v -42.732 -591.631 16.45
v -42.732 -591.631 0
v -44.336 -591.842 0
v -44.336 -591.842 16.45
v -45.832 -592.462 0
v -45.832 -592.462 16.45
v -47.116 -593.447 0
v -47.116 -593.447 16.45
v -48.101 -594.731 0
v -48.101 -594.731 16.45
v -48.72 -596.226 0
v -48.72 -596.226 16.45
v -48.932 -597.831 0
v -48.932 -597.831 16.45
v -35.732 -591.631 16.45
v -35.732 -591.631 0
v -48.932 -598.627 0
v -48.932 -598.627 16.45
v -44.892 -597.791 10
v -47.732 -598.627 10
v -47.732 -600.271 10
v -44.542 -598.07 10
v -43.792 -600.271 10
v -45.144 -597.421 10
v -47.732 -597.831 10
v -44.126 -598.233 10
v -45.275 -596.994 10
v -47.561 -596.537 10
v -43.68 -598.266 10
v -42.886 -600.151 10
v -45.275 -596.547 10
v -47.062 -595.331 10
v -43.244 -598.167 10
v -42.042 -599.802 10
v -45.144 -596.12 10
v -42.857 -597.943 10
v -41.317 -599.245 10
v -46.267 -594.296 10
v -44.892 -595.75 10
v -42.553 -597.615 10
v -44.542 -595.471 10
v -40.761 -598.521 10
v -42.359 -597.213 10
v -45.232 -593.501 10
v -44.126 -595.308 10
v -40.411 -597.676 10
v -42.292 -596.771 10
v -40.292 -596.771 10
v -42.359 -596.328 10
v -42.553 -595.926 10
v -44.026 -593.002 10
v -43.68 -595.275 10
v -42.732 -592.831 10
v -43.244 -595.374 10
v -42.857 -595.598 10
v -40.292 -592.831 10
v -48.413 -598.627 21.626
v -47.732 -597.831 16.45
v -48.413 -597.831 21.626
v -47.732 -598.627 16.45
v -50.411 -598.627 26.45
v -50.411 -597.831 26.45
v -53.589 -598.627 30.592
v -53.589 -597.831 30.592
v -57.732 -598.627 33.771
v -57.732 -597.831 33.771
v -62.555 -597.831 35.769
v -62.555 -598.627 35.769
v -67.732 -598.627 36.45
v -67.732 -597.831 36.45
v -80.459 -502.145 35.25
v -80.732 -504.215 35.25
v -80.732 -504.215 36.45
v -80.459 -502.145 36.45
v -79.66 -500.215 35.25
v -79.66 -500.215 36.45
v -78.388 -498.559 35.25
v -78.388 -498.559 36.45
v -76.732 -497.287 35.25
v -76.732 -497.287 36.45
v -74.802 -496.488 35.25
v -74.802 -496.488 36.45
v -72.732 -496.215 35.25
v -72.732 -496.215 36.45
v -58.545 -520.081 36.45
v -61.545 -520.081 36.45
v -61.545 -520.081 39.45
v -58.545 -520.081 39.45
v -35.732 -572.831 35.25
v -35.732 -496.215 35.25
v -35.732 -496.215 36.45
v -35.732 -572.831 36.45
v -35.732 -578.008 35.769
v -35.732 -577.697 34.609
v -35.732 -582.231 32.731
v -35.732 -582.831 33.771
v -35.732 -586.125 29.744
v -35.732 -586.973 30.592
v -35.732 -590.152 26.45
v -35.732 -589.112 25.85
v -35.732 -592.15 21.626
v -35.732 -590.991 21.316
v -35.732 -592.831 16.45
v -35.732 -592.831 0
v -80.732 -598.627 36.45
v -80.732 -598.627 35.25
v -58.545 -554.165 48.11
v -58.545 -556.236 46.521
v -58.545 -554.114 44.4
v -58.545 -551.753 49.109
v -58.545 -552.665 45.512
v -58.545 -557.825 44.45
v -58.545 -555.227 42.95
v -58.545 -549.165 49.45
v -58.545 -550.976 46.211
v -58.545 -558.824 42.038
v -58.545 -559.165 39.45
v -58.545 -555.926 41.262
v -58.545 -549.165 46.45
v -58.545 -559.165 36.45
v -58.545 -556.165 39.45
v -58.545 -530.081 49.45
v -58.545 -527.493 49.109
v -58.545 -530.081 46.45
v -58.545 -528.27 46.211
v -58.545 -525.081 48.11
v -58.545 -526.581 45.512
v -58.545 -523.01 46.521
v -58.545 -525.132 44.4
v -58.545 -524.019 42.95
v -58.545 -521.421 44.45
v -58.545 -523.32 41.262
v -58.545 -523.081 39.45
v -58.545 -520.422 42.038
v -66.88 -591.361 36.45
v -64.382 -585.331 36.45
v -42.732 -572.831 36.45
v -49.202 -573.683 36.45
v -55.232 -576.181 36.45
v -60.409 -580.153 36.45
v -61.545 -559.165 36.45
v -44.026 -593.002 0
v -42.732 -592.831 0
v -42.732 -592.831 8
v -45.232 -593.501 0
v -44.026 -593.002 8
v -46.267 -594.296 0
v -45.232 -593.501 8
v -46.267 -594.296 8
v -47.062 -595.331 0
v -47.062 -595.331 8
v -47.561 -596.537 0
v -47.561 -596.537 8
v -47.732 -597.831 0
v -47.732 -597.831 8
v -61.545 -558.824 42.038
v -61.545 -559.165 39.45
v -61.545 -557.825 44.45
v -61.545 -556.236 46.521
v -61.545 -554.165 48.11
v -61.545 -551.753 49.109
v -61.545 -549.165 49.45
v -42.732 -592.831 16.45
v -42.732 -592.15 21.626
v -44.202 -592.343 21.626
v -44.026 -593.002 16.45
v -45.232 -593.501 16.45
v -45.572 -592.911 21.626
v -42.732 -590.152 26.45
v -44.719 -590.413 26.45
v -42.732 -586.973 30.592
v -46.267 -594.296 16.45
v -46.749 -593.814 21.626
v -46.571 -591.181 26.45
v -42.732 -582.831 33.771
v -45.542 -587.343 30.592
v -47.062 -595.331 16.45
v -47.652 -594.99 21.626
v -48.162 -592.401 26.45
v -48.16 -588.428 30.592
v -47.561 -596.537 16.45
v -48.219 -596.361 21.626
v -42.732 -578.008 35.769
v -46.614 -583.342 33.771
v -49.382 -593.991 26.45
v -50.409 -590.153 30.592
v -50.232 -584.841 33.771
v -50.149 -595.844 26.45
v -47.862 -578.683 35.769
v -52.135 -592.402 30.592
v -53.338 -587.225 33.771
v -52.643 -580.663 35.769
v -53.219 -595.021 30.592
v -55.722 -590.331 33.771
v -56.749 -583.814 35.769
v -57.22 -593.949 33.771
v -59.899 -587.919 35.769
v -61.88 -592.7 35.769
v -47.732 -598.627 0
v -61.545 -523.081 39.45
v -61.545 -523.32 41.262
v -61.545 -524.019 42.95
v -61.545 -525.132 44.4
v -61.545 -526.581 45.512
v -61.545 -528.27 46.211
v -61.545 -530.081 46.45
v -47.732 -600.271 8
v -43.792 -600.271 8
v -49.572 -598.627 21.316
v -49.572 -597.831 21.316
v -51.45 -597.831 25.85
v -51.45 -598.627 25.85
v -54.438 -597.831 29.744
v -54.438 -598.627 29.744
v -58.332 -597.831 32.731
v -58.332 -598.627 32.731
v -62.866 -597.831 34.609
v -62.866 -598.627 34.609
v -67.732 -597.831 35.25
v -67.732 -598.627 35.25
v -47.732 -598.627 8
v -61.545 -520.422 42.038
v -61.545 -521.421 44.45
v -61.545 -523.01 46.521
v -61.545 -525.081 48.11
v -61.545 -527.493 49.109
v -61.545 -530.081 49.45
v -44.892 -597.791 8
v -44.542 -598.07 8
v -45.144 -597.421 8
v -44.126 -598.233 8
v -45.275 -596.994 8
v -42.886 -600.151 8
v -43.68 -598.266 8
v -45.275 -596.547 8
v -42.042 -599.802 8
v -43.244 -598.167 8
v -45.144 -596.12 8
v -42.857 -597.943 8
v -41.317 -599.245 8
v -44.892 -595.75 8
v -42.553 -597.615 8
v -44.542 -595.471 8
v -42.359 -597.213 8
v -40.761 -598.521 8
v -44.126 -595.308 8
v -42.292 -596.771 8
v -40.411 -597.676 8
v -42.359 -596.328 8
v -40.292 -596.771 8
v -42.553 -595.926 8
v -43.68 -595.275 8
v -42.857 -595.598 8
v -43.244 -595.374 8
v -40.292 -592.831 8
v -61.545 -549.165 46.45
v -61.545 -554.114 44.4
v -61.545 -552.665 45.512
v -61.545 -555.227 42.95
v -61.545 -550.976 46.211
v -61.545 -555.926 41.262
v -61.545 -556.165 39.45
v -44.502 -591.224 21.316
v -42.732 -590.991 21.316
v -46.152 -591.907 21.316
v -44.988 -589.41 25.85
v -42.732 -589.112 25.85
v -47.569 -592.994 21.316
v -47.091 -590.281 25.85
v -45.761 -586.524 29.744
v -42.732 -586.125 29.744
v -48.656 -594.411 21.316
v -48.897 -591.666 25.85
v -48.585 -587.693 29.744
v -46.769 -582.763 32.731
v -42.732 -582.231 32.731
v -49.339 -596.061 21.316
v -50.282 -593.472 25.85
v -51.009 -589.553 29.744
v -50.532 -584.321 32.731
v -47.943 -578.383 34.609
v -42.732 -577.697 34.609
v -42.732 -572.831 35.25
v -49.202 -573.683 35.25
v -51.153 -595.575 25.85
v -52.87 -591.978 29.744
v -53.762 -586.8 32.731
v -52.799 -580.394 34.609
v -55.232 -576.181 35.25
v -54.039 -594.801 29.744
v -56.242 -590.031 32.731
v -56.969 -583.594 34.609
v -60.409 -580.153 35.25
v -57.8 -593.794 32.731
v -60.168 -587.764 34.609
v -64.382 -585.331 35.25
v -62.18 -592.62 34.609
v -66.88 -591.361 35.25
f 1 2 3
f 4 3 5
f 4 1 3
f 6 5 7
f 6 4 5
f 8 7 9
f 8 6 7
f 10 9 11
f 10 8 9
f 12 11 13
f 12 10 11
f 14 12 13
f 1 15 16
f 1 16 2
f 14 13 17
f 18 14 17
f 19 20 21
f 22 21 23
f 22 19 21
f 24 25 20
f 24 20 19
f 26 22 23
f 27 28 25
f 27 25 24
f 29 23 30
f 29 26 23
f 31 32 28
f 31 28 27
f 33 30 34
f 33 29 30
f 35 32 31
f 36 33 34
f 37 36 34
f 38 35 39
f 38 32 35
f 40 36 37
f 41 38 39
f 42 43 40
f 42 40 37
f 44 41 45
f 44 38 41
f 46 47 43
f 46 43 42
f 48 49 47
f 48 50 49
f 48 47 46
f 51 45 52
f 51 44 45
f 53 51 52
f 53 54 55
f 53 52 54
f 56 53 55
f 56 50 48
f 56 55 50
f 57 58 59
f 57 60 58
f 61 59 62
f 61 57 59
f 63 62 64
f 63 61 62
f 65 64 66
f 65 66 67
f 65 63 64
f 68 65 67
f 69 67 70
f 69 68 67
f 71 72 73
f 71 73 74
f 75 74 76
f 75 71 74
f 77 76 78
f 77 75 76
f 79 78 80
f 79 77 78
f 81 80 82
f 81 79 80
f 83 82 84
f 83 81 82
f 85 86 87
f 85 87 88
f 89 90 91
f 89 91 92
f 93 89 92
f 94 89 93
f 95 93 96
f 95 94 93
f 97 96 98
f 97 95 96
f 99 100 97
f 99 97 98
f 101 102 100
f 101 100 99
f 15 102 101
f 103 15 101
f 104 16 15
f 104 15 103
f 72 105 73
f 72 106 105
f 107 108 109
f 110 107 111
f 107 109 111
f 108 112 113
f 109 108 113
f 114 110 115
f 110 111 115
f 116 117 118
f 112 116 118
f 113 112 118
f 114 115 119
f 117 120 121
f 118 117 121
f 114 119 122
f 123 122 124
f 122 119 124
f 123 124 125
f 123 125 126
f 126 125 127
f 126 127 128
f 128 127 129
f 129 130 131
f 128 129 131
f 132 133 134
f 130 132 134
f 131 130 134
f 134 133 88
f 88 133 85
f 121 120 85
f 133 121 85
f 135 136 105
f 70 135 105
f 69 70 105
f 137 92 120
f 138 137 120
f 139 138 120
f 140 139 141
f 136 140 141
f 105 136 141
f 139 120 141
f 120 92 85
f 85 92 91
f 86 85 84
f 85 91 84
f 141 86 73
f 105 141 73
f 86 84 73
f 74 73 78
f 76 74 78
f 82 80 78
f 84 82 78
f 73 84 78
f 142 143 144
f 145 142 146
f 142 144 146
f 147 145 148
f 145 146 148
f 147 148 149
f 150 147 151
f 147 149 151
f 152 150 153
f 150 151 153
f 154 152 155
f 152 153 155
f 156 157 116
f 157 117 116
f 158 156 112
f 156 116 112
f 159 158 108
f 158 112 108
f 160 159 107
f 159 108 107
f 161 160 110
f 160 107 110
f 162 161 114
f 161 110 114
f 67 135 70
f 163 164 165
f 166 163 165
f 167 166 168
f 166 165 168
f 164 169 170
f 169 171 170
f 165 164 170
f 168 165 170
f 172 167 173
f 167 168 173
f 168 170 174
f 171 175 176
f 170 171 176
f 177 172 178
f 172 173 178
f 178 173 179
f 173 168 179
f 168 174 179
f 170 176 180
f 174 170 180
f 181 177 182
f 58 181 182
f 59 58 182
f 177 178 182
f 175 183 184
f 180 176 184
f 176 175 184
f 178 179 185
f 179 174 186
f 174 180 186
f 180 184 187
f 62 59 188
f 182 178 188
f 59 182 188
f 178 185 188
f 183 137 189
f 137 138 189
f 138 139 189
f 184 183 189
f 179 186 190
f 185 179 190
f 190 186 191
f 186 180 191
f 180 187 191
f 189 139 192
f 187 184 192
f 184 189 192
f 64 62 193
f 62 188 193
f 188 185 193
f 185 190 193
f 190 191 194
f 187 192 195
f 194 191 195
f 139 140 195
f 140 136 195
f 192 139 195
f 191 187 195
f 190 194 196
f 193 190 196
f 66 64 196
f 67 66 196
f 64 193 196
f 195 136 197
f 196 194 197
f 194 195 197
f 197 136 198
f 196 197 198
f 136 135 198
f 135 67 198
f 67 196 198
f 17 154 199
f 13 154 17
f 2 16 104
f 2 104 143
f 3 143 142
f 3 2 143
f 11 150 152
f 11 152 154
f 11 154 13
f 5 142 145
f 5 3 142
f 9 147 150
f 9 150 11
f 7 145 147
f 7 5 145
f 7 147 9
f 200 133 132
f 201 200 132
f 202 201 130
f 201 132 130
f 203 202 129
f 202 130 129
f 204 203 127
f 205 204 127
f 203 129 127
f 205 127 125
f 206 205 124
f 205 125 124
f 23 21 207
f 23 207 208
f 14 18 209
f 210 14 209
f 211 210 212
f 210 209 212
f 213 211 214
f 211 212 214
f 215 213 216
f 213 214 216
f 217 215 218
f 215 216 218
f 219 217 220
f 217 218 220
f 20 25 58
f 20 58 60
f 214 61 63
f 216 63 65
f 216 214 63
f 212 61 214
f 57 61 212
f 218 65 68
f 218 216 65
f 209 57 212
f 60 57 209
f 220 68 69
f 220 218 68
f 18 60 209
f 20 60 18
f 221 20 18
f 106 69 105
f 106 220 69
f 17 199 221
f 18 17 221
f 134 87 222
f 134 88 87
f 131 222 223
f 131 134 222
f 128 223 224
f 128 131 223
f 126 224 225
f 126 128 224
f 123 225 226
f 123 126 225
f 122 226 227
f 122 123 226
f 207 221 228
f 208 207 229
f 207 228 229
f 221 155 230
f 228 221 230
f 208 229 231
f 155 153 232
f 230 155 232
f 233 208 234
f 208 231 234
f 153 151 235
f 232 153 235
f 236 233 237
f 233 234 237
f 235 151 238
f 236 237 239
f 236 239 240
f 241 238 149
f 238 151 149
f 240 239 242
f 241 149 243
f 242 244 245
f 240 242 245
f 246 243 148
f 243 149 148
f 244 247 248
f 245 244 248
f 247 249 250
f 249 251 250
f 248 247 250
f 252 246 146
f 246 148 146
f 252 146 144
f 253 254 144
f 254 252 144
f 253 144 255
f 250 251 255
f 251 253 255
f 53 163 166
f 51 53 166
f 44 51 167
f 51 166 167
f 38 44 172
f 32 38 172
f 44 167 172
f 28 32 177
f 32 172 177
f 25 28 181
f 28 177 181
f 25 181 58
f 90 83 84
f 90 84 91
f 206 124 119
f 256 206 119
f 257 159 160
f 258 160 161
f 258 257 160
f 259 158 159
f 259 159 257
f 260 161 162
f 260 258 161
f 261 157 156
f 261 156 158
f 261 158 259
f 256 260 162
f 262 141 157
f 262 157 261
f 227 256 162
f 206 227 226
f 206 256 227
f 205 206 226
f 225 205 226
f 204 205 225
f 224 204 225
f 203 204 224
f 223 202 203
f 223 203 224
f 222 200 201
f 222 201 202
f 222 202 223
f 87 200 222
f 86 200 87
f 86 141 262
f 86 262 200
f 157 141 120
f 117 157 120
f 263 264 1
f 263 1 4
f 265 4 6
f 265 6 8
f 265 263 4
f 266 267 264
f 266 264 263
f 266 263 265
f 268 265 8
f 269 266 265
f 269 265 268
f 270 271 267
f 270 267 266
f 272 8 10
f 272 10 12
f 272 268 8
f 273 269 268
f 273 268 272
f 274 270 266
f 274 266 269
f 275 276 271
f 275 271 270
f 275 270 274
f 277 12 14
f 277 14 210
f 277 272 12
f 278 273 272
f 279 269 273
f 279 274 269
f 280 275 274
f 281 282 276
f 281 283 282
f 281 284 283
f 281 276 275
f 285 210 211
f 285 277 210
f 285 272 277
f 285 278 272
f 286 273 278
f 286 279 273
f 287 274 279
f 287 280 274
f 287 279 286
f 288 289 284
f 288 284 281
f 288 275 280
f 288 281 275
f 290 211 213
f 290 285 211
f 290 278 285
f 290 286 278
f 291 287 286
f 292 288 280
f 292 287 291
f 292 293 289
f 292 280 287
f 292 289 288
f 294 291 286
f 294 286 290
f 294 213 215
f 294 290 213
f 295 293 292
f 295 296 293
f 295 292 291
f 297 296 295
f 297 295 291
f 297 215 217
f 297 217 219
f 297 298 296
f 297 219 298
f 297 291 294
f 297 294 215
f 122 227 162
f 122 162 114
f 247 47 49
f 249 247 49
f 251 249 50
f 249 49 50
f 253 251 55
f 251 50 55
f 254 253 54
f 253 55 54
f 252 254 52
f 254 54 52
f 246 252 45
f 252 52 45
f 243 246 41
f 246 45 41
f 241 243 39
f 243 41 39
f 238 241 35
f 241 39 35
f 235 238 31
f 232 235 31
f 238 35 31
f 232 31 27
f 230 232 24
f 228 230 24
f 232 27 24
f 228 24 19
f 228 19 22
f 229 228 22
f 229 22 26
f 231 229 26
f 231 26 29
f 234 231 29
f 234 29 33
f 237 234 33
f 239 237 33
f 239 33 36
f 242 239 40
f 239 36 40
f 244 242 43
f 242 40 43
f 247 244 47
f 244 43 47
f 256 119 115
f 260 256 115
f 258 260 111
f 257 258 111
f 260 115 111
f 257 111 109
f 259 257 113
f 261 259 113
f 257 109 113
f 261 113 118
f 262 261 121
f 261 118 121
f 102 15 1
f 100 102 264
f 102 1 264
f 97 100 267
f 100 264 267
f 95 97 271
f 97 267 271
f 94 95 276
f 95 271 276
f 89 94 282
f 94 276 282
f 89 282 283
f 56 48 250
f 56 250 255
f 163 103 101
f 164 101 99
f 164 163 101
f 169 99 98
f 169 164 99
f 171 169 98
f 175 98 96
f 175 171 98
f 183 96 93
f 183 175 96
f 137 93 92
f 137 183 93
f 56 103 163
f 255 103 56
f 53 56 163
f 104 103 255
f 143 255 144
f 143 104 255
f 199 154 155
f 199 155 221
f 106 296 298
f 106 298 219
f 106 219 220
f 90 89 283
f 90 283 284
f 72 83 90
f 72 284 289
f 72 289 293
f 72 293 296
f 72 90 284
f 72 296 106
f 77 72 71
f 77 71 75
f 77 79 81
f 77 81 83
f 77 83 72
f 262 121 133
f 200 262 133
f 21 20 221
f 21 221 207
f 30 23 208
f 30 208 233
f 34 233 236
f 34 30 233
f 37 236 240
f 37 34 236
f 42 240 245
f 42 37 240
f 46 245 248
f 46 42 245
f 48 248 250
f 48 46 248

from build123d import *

# Parameters (mm, degrees)
BOSS_EXTRUDE1_DEPTH = 36.45
FILLET1_R           = 5
FILLET2_R           = 20
SHELL2_T            = -1.2
BOSS_EXTRUDE2_START = 2
SKETCH3_R           = 1.5
BOSS_EXTRUDE2_DEPTH = 2
SKETCH4_W           = 3
SKETCH4_H           = 39.083354503
BOSS_EXTRUDE3_DEPTH = 13
FILLET3_R           = 10
CUT_EXTRUDE1_DEPTH  = 13


with BuildPart() as part:
    # Sketch1 → Boss-Extrude1 (new body)
    with BuildSketch(Plane.XY):
        with BuildLine():
            Line((-72.731515082, -496.215408036), (-35.731515082, -496.215408036))
            Line((-35.731515082, -496.215408036), (-35.731515082, -592.831160904))
            Line((-35.731515082, -592.831160904), (-47.731515082, -592.831160904))
            Line((-47.731515082, -592.831160904), (-47.731515082, -598.627239774))
            Line((-47.731515082, -598.627239774), (-80.731515082, -598.627239774))
            Line((-80.731515082, -598.627239774), (-80.731515082, -504.215408036))
            ThreePointArc((-80.731515082, -504.215408036), (-78.388369332, -498.558553786), (-72.731515082, -496.215408036))
        make_face()
    extrude(amount=BOSS_EXTRUDE1_DEPTH)

    # Fillet1
    fillet1_edges = [part.edges().sort_by_distance(p)[0] for p in [
        (-47.731515082, -592.831160904, 18.225),
    ]]
    fillet(fillet1_edges, radius=FILLET1_R)

    # Fillet2
    fillet2_edges = [part.edges().sort_by_distance(p)[0] for p in [
        (-39.231515082, -592.831160904, 36.45),
        (-46.267048988, -594.295626999, 36.45),
        (-47.731515082, -598.229200339, 36.45),
    ]]
    fillet(fillet2_edges, radius=FILLET2_R)

    # Shell2
    shell2_openings = [part.faces().sort_by_distance(p)[0] for p in [
        (-78.388369332, -498.558553786, 18.225),
        (-80.731515082, -551.421323905, 18.225),
        (-65.156208184, -598.627239774, 17.167742853),
        (-35.731515082, -543.427965052, 17.881276605),
        (-54.231515082, -496.215408036, 18.225),
        (-58.408271611, -546.88462098, 0),
    ]]
    offset(amount=SHELL2_T, openings=shell2_openings, kind=Kind.INTERSECTION)

    # Sketch3 → Boss-Extrude2 (add)
    with BuildSketch(Plane.XY.offset(8).offset(BOSS_EXTRUDE2_START)):
        with BuildLine():
            Line((-47.731515082, -597.831160904), (-47.731515082, -600.270500733))
            Line((-47.731515082, -600.270500733), (-43.792175254, -600.270500733))
            ThreePointArc((-43.792175254, -600.270500733), (-41.31730152, -599.245374467), (-40.292175254, -596.770500733))
            Line((-40.292175254, -596.770500733), (-40.292175254, -592.831160904))
            Line((-40.292175254, -592.831160904), (-42.731515082, -592.831160904))
            ThreePointArc((-42.731515082, -592.831160904), (-46.267048988, -594.295626999), (-47.731515082, -597.831160904))
        make_face()
        with Locations((-43.792175254, -596.770500733)):
            Circle(SKETCH3_R, mode=Mode.SUBTRACT)
    extrude(amount=-BOSS_EXTRUDE2_DEPTH)

    # Sketch4 → Boss-Extrude3 (add)
    with BuildSketch(Plane.XY.offset(36.45)):
        with Locations((-60.045293953, -539.622953905)):
            Rectangle(SKETCH4_W, SKETCH4_H)
    extrude(amount=BOSS_EXTRUDE3_DEPTH)

    # Fillet3
    fillet3_edges = [part.edges().sort_by_distance(p)[0] for p in [
        (-60.045293953, -559.164631156, 49.45),
        (-60.045293953, -520.081276653, 49.45),
    ]]
    fillet(fillet3_edges, radius=FILLET3_R)

    # Sketch5 → Cut-Extrude1 (cut)
    with BuildSketch(Plane(origin=(-58.545293953, 0, 0), x_dir=(0, 0, -1), z_dir=(1, 0, 0))):
        with BuildLine():
            Line((-39.45, -556.164631156), (-39.45, -523.081276653))
            ThreePointArc((-39.45, -523.081276653), (-44.399747468, -525.131529185), (-46.45, -530.081276653))
            Line((-46.45, -530.081276653), (-46.45, -549.164631156))
            ThreePointArc((-46.45, -549.164631156), (-44.399747468, -554.114378625), (-39.45, -556.164631156))
        make_face()
    extrude(amount=-CUT_EXTRUDE1_DEPTH, mode=Mode.SUBTRACT)


solid = part.part
